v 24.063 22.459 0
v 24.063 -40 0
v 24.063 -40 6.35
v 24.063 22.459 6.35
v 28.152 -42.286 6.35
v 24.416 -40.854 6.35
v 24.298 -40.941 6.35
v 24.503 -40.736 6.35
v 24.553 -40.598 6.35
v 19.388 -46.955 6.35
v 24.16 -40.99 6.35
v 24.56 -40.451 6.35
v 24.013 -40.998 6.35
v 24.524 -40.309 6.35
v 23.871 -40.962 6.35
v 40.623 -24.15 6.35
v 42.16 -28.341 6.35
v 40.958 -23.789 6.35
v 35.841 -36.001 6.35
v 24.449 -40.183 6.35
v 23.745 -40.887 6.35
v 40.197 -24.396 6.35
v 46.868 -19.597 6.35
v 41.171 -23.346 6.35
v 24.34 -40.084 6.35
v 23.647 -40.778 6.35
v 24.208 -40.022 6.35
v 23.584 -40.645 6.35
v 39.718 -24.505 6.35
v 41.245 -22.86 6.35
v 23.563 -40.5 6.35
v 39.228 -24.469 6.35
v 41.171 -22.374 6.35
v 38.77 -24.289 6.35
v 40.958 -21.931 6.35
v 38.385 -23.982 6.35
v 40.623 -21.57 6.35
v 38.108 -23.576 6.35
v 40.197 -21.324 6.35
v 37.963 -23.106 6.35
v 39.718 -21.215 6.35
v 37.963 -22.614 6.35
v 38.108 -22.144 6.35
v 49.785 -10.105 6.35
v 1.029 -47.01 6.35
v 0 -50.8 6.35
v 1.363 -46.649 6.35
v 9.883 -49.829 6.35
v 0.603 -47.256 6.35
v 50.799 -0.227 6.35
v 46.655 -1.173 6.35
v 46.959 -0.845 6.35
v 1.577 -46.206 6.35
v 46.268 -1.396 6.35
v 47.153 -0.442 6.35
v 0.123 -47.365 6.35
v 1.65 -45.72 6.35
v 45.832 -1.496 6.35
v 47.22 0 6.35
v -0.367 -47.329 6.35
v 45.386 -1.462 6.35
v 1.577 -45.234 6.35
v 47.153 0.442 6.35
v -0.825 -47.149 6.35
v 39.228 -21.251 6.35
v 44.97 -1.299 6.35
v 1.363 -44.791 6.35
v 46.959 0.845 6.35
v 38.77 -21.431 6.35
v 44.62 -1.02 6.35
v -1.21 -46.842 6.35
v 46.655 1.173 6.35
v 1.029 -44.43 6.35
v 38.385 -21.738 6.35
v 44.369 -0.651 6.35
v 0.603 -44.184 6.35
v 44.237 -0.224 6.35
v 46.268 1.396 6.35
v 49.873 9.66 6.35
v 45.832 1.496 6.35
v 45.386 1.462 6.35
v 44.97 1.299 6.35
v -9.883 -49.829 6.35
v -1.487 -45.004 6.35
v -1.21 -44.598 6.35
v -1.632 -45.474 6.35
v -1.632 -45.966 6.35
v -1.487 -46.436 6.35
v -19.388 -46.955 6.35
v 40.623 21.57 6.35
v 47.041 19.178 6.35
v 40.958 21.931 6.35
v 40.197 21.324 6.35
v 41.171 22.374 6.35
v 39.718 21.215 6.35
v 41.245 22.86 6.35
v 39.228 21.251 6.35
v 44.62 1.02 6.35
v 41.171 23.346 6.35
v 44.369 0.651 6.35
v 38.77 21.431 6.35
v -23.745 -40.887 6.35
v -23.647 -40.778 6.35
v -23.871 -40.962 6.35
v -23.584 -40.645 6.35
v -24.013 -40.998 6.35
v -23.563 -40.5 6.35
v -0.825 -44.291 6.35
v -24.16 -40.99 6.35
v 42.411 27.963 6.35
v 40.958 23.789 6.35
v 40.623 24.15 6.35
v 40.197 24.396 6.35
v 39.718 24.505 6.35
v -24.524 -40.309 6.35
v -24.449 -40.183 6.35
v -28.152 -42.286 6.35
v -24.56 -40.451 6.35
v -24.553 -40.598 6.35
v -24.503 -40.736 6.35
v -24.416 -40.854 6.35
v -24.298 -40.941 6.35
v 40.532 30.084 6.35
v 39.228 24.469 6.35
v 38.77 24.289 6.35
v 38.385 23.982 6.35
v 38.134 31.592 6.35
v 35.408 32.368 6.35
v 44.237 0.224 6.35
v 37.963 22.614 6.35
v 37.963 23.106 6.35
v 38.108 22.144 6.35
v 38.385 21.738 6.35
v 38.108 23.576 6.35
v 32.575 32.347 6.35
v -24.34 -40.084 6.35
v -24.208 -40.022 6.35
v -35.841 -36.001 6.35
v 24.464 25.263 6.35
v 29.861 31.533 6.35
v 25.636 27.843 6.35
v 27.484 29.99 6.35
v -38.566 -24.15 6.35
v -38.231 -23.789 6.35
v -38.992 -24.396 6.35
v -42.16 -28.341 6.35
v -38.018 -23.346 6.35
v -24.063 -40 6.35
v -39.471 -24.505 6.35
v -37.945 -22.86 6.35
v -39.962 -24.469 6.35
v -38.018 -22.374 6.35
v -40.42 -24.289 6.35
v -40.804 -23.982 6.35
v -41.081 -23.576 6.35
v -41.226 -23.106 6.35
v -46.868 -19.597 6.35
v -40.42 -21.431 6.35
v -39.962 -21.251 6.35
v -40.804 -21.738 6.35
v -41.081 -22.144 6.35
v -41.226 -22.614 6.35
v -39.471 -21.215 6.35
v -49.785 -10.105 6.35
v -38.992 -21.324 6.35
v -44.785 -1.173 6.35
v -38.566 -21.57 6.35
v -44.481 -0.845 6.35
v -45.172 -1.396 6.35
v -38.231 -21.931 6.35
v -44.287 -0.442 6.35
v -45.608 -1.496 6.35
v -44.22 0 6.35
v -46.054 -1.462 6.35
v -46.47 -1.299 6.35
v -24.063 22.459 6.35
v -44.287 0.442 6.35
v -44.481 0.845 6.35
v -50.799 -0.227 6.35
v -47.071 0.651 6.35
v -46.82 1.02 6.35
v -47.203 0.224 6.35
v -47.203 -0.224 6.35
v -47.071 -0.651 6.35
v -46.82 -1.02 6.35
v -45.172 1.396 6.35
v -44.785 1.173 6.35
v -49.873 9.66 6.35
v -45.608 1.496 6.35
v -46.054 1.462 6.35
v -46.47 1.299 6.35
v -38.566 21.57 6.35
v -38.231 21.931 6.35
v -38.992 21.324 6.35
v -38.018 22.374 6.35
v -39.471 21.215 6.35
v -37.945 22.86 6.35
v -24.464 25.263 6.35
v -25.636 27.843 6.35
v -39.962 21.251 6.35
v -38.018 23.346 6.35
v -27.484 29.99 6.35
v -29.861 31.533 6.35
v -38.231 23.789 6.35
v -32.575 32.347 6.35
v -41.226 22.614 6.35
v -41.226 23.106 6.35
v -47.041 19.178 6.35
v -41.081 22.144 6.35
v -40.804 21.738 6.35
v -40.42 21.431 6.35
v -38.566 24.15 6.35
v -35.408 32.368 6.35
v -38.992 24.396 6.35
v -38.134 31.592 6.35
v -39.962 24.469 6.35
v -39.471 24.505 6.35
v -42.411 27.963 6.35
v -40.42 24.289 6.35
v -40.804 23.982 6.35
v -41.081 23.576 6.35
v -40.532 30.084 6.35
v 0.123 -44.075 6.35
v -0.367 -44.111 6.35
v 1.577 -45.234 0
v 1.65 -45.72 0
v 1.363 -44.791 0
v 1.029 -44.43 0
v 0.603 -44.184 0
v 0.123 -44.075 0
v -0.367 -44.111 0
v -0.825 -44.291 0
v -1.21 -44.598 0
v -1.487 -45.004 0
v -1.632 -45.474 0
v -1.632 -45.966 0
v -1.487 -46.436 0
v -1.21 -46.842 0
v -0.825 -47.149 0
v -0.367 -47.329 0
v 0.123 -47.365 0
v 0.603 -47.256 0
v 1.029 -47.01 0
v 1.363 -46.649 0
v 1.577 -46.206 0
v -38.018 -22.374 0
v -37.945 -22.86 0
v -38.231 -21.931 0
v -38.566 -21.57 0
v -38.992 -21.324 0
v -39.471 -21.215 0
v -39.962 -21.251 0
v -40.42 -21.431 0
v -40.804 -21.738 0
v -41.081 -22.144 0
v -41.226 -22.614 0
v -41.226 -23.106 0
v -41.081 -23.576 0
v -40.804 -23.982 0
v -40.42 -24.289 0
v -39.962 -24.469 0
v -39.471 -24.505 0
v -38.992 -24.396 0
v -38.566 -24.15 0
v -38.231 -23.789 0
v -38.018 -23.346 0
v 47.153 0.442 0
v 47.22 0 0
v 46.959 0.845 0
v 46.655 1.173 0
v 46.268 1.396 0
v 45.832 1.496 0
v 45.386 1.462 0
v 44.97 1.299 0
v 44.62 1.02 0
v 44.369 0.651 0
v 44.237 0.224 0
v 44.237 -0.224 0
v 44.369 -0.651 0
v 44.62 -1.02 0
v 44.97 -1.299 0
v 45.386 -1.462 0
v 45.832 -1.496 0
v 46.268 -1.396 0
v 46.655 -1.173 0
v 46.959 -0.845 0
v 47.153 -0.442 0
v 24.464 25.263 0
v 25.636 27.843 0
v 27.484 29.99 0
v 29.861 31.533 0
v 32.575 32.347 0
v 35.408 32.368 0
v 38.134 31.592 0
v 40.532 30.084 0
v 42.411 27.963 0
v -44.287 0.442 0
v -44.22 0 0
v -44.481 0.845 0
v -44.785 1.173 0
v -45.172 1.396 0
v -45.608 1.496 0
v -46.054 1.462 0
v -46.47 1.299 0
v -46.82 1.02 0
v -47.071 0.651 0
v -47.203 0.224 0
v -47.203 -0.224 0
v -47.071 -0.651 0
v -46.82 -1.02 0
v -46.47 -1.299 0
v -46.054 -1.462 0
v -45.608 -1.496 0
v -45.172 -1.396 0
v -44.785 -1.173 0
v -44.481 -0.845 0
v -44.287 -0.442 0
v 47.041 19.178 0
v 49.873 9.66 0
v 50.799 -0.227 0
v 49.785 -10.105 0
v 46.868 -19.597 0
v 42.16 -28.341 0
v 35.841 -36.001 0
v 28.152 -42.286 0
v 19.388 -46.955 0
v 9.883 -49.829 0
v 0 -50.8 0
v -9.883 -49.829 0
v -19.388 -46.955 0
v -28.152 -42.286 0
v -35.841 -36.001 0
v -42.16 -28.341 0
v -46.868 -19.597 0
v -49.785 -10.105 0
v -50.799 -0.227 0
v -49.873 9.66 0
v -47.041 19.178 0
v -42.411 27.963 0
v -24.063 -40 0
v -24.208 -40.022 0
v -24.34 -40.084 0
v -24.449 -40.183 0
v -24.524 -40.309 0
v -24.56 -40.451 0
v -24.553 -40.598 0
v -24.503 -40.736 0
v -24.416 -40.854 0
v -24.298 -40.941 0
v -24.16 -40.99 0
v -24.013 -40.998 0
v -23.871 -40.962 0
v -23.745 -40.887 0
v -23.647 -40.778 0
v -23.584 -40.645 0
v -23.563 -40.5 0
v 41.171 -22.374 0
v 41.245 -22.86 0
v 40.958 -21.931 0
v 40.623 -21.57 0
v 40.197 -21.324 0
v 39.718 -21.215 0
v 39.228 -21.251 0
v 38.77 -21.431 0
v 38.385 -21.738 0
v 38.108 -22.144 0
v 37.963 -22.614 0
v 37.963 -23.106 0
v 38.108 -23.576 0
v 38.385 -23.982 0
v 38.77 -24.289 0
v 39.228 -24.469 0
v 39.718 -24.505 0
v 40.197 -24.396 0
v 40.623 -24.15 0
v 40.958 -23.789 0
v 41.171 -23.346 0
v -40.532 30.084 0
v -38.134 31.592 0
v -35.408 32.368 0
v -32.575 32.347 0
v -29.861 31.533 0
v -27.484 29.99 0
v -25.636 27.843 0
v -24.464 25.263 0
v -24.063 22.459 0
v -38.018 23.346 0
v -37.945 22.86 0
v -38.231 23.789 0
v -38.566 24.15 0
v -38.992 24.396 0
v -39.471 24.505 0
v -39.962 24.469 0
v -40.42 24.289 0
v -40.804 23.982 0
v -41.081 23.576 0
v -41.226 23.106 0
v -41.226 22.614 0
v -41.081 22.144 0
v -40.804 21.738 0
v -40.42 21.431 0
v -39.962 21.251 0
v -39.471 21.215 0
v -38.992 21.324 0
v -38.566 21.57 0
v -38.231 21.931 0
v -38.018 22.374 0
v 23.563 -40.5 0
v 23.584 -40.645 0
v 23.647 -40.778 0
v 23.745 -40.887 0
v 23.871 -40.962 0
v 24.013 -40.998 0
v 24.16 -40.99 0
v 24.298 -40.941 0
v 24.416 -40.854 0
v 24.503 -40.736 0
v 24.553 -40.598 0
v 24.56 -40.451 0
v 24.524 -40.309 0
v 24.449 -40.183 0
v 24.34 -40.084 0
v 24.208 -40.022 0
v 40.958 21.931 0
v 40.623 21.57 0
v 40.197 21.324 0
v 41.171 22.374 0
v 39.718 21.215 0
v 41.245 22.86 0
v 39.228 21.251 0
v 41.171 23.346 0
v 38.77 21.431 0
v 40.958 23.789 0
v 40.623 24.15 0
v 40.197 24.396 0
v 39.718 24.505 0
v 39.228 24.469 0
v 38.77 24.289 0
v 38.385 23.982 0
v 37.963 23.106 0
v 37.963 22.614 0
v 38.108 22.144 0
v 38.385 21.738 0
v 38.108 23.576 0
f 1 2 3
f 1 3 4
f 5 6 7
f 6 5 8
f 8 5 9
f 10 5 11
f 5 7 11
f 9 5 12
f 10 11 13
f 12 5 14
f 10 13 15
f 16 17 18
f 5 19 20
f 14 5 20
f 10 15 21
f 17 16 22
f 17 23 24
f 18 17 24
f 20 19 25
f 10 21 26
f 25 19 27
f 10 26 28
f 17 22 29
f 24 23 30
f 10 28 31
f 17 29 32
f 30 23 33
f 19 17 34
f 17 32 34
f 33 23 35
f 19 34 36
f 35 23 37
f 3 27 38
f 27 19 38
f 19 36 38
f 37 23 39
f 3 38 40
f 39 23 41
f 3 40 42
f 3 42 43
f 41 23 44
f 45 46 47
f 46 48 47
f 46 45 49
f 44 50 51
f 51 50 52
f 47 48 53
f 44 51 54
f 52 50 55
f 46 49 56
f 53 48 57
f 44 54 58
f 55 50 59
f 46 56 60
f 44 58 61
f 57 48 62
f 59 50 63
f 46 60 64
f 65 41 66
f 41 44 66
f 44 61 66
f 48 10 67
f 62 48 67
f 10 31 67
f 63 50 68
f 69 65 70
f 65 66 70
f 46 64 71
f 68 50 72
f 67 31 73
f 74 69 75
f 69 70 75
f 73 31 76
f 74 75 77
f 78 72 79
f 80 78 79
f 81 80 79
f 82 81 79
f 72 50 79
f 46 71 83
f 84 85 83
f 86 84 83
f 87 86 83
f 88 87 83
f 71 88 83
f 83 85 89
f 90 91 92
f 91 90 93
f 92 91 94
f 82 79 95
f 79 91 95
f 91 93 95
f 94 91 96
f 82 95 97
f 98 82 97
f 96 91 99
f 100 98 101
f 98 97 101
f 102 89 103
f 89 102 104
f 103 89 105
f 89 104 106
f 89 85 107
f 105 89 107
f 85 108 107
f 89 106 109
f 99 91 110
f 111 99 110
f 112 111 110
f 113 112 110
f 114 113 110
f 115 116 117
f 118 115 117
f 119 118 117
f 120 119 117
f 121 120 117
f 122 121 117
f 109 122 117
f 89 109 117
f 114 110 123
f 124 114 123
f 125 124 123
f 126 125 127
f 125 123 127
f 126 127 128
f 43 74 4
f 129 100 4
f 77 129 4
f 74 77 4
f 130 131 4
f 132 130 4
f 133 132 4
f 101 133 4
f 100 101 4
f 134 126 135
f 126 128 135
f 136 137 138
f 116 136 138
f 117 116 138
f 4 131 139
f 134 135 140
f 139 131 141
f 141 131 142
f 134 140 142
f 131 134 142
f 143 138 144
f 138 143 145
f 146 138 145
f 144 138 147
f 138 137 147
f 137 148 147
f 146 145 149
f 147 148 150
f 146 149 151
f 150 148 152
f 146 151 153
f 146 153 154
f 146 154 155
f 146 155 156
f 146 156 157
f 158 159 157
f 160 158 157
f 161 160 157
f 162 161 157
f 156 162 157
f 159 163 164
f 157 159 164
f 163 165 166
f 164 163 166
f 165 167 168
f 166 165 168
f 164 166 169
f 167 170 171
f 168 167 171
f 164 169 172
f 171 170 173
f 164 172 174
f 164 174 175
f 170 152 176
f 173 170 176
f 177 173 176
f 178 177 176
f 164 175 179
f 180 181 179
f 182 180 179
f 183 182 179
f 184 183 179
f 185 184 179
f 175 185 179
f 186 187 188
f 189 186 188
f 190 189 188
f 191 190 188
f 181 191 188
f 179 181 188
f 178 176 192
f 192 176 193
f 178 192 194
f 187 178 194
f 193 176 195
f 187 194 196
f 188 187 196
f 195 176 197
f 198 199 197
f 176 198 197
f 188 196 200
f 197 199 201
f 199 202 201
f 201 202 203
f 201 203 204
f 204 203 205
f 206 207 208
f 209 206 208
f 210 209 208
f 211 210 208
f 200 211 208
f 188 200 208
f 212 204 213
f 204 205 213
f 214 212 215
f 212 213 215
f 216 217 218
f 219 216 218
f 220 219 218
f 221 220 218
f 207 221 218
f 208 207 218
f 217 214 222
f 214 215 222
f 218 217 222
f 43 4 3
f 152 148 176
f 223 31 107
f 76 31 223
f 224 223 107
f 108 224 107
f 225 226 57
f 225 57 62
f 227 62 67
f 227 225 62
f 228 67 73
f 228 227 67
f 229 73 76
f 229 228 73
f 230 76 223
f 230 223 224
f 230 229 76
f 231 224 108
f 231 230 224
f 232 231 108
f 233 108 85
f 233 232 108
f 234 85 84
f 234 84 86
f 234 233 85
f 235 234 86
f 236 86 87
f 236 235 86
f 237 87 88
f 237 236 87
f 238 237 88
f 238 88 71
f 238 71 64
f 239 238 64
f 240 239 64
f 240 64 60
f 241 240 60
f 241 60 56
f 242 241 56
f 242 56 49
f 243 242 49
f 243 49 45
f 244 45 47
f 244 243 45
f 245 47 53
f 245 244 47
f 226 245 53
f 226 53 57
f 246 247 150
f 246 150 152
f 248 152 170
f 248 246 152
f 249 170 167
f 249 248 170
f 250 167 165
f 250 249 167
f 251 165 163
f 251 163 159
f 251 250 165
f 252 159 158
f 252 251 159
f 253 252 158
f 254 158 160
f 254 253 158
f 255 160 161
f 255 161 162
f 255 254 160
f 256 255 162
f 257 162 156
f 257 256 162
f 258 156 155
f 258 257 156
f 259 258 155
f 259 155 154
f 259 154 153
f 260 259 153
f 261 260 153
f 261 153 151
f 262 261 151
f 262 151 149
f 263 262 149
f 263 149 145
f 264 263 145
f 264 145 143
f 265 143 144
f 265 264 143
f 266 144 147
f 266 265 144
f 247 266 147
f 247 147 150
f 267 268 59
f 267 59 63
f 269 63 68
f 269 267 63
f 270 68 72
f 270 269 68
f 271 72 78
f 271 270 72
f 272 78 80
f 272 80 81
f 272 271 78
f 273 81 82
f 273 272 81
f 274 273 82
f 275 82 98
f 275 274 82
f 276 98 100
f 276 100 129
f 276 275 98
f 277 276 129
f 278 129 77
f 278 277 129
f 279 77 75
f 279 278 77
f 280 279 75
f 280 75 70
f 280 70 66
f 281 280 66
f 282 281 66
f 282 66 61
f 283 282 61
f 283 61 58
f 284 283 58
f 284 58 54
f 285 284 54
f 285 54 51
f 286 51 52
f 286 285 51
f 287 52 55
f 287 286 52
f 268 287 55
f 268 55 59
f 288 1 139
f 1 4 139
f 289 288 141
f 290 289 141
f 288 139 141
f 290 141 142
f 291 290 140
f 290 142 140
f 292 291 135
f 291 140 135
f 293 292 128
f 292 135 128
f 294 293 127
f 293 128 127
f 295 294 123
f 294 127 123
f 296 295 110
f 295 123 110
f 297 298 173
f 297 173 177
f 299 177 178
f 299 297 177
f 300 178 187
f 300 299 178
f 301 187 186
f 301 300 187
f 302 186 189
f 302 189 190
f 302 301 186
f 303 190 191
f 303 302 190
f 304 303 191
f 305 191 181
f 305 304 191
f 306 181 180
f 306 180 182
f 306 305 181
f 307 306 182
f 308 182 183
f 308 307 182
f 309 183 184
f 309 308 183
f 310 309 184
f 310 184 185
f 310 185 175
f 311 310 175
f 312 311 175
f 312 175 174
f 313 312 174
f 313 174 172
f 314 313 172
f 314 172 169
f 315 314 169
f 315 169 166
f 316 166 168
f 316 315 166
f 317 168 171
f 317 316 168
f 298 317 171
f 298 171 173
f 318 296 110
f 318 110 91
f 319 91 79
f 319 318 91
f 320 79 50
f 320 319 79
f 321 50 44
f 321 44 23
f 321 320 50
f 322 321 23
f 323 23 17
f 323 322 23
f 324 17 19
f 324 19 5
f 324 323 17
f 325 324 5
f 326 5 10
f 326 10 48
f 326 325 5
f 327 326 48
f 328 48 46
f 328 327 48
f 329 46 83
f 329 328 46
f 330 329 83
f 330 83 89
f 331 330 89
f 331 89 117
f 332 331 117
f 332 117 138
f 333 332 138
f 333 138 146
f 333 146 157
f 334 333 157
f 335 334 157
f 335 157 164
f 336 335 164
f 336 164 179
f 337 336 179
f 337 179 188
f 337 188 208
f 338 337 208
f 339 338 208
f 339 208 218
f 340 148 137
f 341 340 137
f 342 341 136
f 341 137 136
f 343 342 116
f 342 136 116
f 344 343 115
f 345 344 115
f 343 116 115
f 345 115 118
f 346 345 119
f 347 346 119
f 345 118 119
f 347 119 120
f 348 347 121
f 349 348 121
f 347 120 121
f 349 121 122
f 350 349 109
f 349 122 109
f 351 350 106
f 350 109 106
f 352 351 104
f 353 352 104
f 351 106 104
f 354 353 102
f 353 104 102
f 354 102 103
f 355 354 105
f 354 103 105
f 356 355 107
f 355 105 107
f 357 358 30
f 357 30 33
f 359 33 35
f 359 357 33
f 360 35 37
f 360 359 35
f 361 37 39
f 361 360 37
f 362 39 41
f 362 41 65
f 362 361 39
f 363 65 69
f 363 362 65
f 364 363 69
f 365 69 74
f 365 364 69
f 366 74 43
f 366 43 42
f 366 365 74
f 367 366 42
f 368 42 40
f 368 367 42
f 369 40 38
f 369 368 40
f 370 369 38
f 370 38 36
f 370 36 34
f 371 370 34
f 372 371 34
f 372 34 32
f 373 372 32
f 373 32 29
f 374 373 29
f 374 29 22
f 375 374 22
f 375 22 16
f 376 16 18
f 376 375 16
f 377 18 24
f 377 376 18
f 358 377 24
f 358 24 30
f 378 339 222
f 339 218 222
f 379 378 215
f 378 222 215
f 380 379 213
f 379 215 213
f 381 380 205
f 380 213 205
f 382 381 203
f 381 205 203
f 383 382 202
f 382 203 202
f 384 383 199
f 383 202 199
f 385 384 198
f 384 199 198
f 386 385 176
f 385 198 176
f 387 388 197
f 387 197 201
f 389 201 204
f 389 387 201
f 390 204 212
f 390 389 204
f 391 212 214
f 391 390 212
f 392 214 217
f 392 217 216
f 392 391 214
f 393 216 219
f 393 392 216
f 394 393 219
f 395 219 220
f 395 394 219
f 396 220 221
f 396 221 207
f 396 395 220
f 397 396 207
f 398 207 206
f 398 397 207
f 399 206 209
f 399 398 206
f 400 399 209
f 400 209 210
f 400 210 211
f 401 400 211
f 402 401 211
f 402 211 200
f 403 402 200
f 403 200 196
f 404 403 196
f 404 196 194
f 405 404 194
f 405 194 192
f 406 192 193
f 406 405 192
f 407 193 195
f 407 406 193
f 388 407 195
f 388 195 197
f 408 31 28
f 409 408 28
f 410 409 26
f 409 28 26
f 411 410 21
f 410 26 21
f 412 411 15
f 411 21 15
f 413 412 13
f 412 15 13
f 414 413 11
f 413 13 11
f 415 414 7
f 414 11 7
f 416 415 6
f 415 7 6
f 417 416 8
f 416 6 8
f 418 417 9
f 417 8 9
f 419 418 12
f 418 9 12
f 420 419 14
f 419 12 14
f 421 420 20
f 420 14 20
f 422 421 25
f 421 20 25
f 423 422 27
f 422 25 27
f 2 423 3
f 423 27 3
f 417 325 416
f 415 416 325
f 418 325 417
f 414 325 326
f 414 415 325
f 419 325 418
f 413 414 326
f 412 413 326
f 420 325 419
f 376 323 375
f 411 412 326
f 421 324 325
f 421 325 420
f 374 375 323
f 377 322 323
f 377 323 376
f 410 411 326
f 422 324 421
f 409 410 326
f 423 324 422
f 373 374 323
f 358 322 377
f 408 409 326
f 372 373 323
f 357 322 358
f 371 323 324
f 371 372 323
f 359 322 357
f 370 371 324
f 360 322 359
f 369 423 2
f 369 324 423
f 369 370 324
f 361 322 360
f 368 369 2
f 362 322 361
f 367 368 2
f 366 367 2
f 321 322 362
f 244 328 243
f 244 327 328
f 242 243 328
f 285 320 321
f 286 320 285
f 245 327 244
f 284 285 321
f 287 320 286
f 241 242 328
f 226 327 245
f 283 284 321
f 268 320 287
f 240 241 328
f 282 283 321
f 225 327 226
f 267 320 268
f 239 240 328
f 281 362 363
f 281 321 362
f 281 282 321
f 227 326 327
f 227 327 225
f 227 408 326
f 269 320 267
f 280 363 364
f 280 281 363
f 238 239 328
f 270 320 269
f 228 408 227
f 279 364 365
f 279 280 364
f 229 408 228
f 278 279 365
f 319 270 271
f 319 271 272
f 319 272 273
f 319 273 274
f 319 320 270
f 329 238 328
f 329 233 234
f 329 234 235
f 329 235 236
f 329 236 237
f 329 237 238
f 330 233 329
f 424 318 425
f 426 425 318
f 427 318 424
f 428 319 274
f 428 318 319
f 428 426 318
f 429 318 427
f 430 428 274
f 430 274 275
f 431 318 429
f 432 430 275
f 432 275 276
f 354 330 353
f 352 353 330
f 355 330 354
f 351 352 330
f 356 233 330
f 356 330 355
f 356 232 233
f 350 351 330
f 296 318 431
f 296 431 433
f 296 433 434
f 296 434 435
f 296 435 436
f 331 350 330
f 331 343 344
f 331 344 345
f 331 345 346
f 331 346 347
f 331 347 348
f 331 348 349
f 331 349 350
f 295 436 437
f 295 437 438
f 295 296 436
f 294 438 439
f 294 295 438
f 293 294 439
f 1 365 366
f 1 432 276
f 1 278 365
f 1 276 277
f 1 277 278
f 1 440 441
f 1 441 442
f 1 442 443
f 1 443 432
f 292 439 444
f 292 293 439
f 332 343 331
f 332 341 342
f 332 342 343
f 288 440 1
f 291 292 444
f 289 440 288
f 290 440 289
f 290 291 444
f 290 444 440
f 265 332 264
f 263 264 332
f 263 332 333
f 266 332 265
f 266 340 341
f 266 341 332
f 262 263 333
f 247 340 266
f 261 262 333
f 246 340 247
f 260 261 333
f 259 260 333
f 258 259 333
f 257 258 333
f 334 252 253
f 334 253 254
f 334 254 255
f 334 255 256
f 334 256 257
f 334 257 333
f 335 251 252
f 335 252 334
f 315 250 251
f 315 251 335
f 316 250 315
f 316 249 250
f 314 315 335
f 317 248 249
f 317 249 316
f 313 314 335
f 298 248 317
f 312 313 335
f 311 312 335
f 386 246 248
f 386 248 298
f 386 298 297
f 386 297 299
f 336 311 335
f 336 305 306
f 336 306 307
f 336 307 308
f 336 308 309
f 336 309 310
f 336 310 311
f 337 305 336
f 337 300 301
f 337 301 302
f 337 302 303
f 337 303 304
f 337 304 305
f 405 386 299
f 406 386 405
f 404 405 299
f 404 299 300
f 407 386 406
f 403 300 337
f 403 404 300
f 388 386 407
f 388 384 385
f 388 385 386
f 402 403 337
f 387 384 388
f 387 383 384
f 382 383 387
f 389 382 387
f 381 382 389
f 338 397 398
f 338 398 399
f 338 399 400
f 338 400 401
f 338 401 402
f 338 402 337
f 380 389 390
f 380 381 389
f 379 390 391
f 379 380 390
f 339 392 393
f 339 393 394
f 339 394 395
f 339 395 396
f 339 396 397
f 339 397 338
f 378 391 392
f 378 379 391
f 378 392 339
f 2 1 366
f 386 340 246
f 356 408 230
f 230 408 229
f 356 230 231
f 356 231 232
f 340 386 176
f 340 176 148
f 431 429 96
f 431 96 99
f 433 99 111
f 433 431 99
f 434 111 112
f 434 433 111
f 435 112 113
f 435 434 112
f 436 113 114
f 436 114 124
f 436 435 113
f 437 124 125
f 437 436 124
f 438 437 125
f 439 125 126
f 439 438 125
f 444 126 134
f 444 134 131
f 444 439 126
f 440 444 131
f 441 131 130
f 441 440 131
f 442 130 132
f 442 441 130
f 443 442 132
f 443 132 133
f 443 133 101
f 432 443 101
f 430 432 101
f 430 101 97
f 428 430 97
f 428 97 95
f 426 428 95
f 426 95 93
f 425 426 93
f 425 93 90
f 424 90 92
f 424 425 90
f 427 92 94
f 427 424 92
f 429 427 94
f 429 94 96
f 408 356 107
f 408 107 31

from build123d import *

# Parameters (mm, degrees)
SKETCH1_R           = 1.5
SKETCH1_R_2         = 1.65
BOSS_EXTRUDE1_DEPTH = 6.35
FILLET2_R           = 10
SKETCH2_R           = 0.5
CUT_EXTRUDE1_DEPTH  = 73.122135992


with BuildPart() as part:
    # Sketch1 → Boss-Extrude1 (new body)
    with BuildSketch(Plane.XY):
        with BuildLine():
            Line((24.062500008, -40.5), (24.062500008, 40.5))
            Line((24.062500008, 40.5), (24.062500008, 44.73964789))
            ThreePointArc((24.062500008, 44.73964789), (0, -50.8), (-24.062500008, 44.73964789))
            Line((-24.062500008, 44.73964789), (-24.062500008, 40.5))
            Line((-24.062500008, 40.5), (-24.062500008, -40.5))
            Line((-24.062500008, -40.5), (24.062500008, -40.5))
        make_face()
        with Locations((-45.72, 0)):
            Circle(SKETCH1_R, mode=Mode.SUBTRACT)
        with Locations((45.72, 0)):
            Circle(SKETCH1_R, mode=Mode.SUBTRACT)
        with Locations((-39.594681461, 22.86)):
            Circle(SKETCH1_R_2, mode=Mode.SUBTRACT)
        with Locations((39.594681461, 22.86)):
            Circle(SKETCH1_R_2, mode=Mode.SUBTRACT)
        with Locations((39.594681461, -22.86)):
            Circle(SKETCH1_R_2, mode=Mode.SUBTRACT)
        with Locations((0, -45.72)):
            Circle(SKETCH1_R_2, mode=Mode.SUBTRACT)
        with Locations((-39.594681461, -22.86)):
            Circle(SKETCH1_R_2, mode=Mode.SUBTRACT)
    extrude(amount=BOSS_EXTRUDE1_DEPTH)

    # Fillet2
    fillet2_edges = [part.edges().sort_by_distance(p)[0] for p in [
        (24.062500008, 44.73964789, 3.175),
        (-24.062500008, 44.73964789, 3.175),
    ]]
    fillet(fillet2_edges, radius=FILLET2_R)

    # Sketch2 → Cut-Extrude1 (cut, through all)
    with BuildSketch(Plane.XY.offset(6.35)):
        with Locations((-24.062500008, -40.5)):
            Circle(SKETCH2_R)
        with Locations((24.062500008, -40.5)):
            Circle(SKETCH2_R)
    extrude(amount=-CUT_EXTRUDE1_DEPTH, mode=Mode.SUBTRACT)


solid = part.part
